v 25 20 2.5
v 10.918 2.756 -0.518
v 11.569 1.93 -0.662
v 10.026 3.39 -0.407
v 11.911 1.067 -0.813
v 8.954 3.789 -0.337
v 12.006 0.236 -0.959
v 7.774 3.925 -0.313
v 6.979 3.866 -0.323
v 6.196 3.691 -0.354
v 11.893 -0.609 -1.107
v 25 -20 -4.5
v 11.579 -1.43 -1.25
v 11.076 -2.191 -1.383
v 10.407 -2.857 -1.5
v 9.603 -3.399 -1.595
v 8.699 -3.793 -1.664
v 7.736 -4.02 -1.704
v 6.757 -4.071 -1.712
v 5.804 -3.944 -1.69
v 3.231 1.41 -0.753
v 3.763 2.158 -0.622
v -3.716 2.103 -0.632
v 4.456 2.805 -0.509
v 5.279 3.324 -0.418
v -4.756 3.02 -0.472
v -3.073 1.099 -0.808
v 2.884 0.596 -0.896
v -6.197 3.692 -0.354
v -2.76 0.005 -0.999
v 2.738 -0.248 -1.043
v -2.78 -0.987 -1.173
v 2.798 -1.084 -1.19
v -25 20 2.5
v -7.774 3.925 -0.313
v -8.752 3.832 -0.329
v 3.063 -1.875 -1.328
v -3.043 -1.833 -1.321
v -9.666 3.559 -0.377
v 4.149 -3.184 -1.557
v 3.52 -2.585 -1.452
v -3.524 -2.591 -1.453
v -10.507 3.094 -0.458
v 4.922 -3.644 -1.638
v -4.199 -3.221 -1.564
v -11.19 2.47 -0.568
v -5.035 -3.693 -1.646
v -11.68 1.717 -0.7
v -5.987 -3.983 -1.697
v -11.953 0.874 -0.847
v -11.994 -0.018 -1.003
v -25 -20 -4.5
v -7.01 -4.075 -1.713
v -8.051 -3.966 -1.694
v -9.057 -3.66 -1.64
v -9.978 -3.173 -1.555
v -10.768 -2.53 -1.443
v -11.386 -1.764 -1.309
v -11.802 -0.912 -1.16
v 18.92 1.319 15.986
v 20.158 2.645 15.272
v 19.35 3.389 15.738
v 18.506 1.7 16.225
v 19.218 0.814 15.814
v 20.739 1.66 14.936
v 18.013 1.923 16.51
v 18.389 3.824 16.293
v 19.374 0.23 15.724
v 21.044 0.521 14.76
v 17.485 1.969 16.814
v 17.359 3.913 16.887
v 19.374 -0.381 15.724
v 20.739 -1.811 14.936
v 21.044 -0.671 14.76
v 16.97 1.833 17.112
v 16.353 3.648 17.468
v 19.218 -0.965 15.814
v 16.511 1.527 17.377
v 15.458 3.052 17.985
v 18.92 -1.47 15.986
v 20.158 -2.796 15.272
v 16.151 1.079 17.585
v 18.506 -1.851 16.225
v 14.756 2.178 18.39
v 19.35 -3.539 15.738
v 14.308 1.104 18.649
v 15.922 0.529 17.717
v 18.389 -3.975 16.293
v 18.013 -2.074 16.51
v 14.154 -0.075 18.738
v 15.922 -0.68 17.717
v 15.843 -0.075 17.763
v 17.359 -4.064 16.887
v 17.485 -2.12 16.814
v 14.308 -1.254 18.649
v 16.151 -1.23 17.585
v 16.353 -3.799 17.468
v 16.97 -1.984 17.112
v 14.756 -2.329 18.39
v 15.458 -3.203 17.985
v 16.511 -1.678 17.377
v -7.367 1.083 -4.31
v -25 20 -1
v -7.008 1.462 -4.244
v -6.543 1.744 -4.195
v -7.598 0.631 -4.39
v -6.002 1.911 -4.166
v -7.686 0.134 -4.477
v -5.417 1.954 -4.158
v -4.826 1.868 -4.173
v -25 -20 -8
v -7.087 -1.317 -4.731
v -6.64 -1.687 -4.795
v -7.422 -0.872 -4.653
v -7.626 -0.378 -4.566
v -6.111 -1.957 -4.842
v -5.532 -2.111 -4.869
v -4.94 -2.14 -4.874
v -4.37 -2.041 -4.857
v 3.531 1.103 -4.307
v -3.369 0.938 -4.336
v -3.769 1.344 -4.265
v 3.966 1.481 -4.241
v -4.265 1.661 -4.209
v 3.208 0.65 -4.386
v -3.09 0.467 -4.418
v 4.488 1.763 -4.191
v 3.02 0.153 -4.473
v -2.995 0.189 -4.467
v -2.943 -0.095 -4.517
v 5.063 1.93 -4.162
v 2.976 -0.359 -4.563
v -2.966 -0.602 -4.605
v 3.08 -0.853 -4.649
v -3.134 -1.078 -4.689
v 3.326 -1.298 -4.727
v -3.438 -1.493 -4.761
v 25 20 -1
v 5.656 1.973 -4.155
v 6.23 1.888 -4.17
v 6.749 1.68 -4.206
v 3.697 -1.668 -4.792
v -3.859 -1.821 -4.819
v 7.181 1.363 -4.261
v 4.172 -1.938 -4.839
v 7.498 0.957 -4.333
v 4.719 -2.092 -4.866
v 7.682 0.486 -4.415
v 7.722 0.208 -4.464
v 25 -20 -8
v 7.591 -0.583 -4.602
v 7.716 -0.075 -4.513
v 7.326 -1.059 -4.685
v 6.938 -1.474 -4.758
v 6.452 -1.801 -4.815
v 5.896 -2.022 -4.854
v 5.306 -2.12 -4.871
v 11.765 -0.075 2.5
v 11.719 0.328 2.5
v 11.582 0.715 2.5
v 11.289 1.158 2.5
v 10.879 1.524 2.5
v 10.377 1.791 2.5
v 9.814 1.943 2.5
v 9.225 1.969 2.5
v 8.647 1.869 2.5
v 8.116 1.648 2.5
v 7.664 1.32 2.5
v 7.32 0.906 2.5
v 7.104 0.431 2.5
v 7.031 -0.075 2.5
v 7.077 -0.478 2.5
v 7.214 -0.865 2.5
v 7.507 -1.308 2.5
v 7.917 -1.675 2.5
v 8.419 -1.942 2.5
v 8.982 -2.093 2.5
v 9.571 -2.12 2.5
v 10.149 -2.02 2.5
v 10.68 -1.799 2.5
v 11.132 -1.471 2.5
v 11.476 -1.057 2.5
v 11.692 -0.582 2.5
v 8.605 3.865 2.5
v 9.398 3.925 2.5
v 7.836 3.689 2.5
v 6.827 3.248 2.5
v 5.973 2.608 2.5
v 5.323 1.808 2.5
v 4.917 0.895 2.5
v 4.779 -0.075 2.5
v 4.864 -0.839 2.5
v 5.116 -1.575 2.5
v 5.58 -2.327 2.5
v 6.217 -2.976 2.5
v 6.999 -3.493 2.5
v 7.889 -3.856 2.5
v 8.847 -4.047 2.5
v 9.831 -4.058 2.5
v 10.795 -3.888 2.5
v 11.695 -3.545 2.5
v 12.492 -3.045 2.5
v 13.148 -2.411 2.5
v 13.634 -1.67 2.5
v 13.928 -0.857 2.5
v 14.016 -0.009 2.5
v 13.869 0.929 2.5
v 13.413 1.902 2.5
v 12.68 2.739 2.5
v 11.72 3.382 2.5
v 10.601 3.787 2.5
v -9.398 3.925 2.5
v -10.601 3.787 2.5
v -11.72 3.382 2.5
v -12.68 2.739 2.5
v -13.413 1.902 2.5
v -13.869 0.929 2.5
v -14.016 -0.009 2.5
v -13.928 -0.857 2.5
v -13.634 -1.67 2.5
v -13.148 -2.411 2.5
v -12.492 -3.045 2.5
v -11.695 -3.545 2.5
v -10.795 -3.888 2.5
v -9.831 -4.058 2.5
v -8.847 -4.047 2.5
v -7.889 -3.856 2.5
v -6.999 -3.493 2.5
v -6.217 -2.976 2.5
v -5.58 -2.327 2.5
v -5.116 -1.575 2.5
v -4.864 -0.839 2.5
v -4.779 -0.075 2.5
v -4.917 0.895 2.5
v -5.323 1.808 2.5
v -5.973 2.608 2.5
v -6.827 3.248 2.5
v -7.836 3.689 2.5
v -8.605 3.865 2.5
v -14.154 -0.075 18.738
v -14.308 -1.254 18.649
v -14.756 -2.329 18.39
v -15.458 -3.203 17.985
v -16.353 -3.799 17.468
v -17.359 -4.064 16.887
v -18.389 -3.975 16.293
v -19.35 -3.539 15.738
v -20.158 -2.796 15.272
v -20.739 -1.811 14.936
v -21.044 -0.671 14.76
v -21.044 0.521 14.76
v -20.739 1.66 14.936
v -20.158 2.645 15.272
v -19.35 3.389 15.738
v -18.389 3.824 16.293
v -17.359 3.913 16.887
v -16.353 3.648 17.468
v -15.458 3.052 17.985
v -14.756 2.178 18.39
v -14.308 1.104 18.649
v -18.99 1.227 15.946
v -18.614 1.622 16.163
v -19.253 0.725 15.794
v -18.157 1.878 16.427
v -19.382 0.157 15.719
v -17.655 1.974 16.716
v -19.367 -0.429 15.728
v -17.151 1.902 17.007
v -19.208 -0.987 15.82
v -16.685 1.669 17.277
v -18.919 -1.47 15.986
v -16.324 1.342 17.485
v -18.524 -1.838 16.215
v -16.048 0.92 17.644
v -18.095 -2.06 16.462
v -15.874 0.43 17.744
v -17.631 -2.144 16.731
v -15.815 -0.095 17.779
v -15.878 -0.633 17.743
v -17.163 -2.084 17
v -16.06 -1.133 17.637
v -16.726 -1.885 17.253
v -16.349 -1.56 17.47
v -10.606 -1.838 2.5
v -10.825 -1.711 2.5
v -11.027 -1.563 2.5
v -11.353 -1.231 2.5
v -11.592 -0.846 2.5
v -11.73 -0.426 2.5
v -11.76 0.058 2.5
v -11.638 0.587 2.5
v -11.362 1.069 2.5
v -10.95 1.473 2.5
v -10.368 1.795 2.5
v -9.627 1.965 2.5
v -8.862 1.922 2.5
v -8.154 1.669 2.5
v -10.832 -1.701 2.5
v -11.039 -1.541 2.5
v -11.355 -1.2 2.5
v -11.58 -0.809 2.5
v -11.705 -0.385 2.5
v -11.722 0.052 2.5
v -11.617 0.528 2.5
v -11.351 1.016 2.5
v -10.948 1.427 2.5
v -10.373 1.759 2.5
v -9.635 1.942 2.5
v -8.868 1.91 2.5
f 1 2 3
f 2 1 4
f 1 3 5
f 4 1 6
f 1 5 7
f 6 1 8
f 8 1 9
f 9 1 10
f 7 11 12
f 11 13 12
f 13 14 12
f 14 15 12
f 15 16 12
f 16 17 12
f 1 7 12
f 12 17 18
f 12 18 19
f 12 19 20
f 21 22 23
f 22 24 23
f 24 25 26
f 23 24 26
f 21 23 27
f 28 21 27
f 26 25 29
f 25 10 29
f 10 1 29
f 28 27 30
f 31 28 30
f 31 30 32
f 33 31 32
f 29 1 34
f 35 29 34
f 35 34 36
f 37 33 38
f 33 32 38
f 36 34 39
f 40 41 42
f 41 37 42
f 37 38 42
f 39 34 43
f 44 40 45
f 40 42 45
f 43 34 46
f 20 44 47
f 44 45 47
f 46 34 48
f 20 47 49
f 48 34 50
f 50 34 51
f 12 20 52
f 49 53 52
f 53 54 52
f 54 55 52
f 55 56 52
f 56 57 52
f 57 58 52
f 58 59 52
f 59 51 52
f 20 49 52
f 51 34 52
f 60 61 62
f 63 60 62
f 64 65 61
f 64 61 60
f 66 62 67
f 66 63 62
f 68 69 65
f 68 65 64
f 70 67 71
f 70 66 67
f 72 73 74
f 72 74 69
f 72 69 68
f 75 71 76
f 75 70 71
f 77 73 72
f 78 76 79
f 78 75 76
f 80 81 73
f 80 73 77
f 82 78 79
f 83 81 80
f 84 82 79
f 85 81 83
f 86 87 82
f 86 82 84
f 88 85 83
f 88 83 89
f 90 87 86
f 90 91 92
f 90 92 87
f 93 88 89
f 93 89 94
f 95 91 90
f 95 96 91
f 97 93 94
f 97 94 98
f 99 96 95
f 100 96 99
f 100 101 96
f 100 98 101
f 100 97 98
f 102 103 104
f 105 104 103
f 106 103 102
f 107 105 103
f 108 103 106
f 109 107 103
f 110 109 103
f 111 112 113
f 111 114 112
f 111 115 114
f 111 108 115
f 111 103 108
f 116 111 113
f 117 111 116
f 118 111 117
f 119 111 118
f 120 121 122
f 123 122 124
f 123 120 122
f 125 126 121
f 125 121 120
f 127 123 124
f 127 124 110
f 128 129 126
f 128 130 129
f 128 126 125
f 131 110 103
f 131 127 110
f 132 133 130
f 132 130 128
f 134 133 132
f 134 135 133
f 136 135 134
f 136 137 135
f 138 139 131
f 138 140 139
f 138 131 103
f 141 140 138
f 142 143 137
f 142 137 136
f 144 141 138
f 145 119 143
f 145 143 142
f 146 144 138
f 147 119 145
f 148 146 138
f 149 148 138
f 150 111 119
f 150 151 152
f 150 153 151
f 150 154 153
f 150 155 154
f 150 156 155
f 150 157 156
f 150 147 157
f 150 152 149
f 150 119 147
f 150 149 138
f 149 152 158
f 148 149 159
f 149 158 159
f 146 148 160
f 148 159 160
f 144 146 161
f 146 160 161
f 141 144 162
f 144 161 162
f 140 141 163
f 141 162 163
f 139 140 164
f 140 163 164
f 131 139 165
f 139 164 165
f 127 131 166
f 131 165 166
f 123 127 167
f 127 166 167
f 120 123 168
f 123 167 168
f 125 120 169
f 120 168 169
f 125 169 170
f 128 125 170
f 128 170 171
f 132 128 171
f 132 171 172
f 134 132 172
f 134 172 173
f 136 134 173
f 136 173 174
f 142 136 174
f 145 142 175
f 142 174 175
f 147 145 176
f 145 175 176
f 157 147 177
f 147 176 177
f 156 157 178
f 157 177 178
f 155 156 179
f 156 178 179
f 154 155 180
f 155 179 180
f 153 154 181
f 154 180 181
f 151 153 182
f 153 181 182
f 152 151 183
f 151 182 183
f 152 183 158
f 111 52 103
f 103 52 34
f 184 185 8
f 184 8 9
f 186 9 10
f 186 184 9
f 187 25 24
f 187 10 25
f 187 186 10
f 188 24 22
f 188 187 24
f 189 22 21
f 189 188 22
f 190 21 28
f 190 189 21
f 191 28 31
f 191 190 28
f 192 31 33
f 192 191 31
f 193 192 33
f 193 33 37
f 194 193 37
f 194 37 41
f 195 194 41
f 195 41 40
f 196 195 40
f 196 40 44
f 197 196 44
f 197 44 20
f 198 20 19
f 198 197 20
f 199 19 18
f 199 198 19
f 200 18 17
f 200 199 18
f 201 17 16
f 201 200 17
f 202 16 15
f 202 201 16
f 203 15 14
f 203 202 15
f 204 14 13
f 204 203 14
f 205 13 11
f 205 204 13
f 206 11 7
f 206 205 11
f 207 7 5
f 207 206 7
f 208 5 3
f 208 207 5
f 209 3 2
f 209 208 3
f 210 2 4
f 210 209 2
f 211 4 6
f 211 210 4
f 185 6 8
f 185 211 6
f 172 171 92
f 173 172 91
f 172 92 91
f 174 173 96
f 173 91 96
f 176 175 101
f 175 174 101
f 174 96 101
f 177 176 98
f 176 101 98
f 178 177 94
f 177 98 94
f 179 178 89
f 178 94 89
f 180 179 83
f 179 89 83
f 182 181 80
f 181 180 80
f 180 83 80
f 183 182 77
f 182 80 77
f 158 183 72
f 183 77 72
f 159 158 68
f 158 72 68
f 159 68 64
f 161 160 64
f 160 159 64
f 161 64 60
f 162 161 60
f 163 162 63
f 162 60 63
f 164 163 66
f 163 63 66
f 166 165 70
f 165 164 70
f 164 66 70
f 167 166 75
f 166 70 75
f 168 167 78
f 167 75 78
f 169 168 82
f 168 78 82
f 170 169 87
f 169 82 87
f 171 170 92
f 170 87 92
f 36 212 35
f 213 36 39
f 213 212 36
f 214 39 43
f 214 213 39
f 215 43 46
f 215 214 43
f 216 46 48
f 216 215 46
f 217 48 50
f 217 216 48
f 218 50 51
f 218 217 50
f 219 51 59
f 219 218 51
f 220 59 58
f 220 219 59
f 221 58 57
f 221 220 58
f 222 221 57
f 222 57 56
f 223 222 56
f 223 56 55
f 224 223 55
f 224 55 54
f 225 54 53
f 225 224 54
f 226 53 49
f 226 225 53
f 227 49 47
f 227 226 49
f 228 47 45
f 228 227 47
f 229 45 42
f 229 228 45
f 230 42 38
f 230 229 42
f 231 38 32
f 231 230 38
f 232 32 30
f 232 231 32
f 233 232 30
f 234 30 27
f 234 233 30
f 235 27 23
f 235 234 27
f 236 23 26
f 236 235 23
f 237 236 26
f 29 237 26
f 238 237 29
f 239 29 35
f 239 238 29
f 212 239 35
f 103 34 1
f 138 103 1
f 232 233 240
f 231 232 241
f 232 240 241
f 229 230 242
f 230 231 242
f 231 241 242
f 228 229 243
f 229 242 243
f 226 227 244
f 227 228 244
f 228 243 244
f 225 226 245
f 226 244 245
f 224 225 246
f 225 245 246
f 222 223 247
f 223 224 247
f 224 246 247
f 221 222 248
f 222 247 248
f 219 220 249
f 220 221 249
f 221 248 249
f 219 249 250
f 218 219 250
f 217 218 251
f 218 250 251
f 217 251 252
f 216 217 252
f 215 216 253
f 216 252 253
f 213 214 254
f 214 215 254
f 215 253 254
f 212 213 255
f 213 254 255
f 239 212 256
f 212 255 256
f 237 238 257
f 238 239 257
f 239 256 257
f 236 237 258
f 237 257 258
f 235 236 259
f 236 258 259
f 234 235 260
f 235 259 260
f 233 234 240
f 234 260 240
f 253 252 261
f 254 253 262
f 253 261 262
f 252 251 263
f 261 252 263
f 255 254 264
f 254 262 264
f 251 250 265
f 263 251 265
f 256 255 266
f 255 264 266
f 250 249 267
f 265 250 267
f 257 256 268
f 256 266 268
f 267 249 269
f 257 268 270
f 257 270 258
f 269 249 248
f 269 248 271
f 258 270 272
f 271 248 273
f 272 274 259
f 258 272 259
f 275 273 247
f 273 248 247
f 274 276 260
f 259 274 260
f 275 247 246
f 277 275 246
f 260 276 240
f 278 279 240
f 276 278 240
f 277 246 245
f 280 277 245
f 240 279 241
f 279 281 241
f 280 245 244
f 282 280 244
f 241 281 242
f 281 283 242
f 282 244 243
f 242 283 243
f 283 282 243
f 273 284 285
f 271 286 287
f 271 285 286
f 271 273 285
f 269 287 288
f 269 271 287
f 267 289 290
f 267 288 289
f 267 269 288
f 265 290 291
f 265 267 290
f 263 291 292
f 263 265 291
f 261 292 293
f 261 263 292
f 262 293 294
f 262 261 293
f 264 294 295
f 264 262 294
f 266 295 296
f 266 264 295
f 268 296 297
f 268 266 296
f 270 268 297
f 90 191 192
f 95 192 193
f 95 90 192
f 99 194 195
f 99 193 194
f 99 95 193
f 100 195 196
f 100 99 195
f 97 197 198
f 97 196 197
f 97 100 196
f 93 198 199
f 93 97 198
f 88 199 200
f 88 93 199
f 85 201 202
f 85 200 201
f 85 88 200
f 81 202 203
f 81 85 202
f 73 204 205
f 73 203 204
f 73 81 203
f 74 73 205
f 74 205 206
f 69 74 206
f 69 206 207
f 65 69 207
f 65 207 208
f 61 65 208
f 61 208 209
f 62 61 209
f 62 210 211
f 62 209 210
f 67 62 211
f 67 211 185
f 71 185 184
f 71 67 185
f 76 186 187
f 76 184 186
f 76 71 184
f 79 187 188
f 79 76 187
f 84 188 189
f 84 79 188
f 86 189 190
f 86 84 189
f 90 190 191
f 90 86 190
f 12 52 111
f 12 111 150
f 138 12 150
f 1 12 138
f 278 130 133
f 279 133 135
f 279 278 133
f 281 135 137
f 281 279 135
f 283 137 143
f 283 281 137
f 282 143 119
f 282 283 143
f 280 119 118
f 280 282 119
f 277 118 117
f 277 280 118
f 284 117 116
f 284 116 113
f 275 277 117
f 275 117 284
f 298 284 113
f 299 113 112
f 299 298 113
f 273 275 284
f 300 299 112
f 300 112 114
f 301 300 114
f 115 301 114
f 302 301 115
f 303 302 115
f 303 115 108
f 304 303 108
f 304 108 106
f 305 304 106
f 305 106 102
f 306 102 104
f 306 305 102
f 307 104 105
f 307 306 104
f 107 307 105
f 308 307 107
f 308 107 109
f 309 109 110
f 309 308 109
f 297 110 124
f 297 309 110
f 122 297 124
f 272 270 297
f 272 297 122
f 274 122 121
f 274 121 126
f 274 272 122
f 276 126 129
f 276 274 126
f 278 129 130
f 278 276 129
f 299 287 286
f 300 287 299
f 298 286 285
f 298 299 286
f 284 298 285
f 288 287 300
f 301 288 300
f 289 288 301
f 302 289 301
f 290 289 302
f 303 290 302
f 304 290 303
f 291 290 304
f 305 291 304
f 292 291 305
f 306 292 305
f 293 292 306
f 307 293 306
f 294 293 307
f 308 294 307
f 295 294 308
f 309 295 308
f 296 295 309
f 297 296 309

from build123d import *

# Parameters (mm, degrees)
F0_W         = 50
F0_H         = 40
F1_DEPTH     = 2.5
F7_R         = 4
F7_R_2       = 2.05
F10_DEPTH    = 8
F11_SIZE2    = 39.99999
F11_SIZE     = 6.99999
F6_R         = 2.05
F12_DEPTH    = 46.3
F13_R        = 2.05
F14_DEPTH    = 68.7
F15_T4_DEPTH = 50
F15_S5_R     = 4
F15_T6_DEPTH = 35
F15_S7_R     = 4
F15_T8_DEPTH = 35


# Not quite as in the source:
# - a fillet or chamfer that OpenCascade refuses, or shapes differently, is made with other operations: its cross-section is extruded or revolved along the edge and cut away or added
# - a fillet or chamfer is up to 0.001 mm smaller than in the source, because OpenCascade refuses the exact size


with BuildPart() as f1:
    # F0 (on Top) → F1 (new body)
    with BuildSketch(Plane.XY):
        Rectangle(F0_W, F0_H)
    extrude(amount=F1_DEPTH)

    # F7 (on offset) → F8 (join, up to the last surface of F1)
    with BuildSketch(Plane(origin=(-11.6521931986, 0, 20.1821906397), x_dir=(0.8660254038, 0, 0.5), z_dir=(0.5, 0, -0.8660254038))):
        with Locations((-6.8889131071, 0.075317279)):
            Circle(F7_R)
        with Locations((-6.8889131071, 0.075317279)):
            Circle(F7_R_2, mode=Mode.SUBTRACT)
    extrude(until=Until.LAST)

    # F9: F1 across plane


with BuildPart() as f1_1:
    add(f1.part)
    add(f1.part.mirror(Plane.YZ))

    # F0 (on Top) → F10 (join)
    with BuildSketch(Plane.XY):
        Rectangle(F0_W, F0_H)
    extrude(amount=-F10_DEPTH)

    # F11 (size 7 and 40 in the source; OpenCascade refuses exactly that, so slightly less here)
    f11_edges = [f1_1.edges().sort_by_distance(p)[0] for p in [
        (0, 20, -8),
    ]]
    f11_side = f1_1.faces().sort_by_distance((0, 20, -2.75))[0]
    chamfer(f11_edges, length=F11_SIZE, length2=F11_SIZE2, reference=f11_side)

    # F6 (on offset) → F12 (cut)
    with BuildSketch(Plane(origin=(-11.6521931986, 0, 20.1821906397), x_dir=(0.8660254038, 0, 0.5), z_dir=(0.5, 0, -0.8660254038))):
        with Locations((-6.8571413867, 0.094557312)):
            Circle(F6_R)
    extrude(amount=F12_DEPTH, mode=Mode.SUBTRACT)

    # F13 (on offset) → F14 (cut)
    with BuildSketch(Plane(origin=(11.6521931986, 0, 20.1821906397), x_dir=(0.8660254038, 0, -0.5), z_dir=(0.5, 0, 0.8660254038))):
        with Locations((6.8889131072, -0.075317279)):
            Circle(F13_R)
    extrude(amount=-F14_DEPTH, mode=Mode.SUBTRACT)

    # F15: chamfer of 7 x 40 on 1 edges, made by hand


with BuildPart() as f15_tool2:
    # F15_s3 → F15_t4 (new body)
    with BuildSketch(Plane.YZ.offset(-25)):
        with BuildLine():
            Line((21.5760487474, 2.7758085308), (-21.5760487474, -4.7758085308))
            Line((-21.5760487474, -4.7758085308), (-22.3760487474, -4.7758085308))
            ThreePointArc((-22.3760487474, -4.7758085308), (-20.8, -1.1379042654), (-20.8, 2.5))
            Line((-20.8, 2.5), (-20, 3.3))
            ThreePointArc((-20, 3.3), (0.7880243737, 3.3), (21.5760487474, 3.5758085308))
            Line((21.5760487474, 3.5758085308), (21.5760487474, 2.7758085308))
        make_face()
    extrude(amount=F15_T4_DEPTH)

    # F15_s5 → F15_t6 (cut, symmetric)
    with BuildSketch(Plane(origin=(0.25, 0, -0.4330127019), x_dir=(0, 1, 0), z_dir=(-0.5, 0, 0.8660254038))):
        with Locations((-0.075317279, 6.8889131071)):
            Circle(F15_S5_R)
    extrude(amount=F15_T6_DEPTH, both=True, mode=Mode.SUBTRACT)

    # F15_s7 → F15_t8 (cut, symmetric)
    with BuildSketch(Plane(origin=(-0.25, 0, -0.4330127019), x_dir=(0, 1, 0), z_dir=(0.5, 0, 0.8660254038))):
        with Locations((-0.075317279, -6.8889131071)):
            Circle(F15_S7_R)
    extrude(amount=F15_T8_DEPTH, both=True, mode=Mode.SUBTRACT)


with BuildPart() as f1_2:
    add(f1_1.part)

    # F15_t1: cut F15_tool2
    add(f15_tool2.part, mode=Mode.SUBTRACT)


solid = f1_2.part
